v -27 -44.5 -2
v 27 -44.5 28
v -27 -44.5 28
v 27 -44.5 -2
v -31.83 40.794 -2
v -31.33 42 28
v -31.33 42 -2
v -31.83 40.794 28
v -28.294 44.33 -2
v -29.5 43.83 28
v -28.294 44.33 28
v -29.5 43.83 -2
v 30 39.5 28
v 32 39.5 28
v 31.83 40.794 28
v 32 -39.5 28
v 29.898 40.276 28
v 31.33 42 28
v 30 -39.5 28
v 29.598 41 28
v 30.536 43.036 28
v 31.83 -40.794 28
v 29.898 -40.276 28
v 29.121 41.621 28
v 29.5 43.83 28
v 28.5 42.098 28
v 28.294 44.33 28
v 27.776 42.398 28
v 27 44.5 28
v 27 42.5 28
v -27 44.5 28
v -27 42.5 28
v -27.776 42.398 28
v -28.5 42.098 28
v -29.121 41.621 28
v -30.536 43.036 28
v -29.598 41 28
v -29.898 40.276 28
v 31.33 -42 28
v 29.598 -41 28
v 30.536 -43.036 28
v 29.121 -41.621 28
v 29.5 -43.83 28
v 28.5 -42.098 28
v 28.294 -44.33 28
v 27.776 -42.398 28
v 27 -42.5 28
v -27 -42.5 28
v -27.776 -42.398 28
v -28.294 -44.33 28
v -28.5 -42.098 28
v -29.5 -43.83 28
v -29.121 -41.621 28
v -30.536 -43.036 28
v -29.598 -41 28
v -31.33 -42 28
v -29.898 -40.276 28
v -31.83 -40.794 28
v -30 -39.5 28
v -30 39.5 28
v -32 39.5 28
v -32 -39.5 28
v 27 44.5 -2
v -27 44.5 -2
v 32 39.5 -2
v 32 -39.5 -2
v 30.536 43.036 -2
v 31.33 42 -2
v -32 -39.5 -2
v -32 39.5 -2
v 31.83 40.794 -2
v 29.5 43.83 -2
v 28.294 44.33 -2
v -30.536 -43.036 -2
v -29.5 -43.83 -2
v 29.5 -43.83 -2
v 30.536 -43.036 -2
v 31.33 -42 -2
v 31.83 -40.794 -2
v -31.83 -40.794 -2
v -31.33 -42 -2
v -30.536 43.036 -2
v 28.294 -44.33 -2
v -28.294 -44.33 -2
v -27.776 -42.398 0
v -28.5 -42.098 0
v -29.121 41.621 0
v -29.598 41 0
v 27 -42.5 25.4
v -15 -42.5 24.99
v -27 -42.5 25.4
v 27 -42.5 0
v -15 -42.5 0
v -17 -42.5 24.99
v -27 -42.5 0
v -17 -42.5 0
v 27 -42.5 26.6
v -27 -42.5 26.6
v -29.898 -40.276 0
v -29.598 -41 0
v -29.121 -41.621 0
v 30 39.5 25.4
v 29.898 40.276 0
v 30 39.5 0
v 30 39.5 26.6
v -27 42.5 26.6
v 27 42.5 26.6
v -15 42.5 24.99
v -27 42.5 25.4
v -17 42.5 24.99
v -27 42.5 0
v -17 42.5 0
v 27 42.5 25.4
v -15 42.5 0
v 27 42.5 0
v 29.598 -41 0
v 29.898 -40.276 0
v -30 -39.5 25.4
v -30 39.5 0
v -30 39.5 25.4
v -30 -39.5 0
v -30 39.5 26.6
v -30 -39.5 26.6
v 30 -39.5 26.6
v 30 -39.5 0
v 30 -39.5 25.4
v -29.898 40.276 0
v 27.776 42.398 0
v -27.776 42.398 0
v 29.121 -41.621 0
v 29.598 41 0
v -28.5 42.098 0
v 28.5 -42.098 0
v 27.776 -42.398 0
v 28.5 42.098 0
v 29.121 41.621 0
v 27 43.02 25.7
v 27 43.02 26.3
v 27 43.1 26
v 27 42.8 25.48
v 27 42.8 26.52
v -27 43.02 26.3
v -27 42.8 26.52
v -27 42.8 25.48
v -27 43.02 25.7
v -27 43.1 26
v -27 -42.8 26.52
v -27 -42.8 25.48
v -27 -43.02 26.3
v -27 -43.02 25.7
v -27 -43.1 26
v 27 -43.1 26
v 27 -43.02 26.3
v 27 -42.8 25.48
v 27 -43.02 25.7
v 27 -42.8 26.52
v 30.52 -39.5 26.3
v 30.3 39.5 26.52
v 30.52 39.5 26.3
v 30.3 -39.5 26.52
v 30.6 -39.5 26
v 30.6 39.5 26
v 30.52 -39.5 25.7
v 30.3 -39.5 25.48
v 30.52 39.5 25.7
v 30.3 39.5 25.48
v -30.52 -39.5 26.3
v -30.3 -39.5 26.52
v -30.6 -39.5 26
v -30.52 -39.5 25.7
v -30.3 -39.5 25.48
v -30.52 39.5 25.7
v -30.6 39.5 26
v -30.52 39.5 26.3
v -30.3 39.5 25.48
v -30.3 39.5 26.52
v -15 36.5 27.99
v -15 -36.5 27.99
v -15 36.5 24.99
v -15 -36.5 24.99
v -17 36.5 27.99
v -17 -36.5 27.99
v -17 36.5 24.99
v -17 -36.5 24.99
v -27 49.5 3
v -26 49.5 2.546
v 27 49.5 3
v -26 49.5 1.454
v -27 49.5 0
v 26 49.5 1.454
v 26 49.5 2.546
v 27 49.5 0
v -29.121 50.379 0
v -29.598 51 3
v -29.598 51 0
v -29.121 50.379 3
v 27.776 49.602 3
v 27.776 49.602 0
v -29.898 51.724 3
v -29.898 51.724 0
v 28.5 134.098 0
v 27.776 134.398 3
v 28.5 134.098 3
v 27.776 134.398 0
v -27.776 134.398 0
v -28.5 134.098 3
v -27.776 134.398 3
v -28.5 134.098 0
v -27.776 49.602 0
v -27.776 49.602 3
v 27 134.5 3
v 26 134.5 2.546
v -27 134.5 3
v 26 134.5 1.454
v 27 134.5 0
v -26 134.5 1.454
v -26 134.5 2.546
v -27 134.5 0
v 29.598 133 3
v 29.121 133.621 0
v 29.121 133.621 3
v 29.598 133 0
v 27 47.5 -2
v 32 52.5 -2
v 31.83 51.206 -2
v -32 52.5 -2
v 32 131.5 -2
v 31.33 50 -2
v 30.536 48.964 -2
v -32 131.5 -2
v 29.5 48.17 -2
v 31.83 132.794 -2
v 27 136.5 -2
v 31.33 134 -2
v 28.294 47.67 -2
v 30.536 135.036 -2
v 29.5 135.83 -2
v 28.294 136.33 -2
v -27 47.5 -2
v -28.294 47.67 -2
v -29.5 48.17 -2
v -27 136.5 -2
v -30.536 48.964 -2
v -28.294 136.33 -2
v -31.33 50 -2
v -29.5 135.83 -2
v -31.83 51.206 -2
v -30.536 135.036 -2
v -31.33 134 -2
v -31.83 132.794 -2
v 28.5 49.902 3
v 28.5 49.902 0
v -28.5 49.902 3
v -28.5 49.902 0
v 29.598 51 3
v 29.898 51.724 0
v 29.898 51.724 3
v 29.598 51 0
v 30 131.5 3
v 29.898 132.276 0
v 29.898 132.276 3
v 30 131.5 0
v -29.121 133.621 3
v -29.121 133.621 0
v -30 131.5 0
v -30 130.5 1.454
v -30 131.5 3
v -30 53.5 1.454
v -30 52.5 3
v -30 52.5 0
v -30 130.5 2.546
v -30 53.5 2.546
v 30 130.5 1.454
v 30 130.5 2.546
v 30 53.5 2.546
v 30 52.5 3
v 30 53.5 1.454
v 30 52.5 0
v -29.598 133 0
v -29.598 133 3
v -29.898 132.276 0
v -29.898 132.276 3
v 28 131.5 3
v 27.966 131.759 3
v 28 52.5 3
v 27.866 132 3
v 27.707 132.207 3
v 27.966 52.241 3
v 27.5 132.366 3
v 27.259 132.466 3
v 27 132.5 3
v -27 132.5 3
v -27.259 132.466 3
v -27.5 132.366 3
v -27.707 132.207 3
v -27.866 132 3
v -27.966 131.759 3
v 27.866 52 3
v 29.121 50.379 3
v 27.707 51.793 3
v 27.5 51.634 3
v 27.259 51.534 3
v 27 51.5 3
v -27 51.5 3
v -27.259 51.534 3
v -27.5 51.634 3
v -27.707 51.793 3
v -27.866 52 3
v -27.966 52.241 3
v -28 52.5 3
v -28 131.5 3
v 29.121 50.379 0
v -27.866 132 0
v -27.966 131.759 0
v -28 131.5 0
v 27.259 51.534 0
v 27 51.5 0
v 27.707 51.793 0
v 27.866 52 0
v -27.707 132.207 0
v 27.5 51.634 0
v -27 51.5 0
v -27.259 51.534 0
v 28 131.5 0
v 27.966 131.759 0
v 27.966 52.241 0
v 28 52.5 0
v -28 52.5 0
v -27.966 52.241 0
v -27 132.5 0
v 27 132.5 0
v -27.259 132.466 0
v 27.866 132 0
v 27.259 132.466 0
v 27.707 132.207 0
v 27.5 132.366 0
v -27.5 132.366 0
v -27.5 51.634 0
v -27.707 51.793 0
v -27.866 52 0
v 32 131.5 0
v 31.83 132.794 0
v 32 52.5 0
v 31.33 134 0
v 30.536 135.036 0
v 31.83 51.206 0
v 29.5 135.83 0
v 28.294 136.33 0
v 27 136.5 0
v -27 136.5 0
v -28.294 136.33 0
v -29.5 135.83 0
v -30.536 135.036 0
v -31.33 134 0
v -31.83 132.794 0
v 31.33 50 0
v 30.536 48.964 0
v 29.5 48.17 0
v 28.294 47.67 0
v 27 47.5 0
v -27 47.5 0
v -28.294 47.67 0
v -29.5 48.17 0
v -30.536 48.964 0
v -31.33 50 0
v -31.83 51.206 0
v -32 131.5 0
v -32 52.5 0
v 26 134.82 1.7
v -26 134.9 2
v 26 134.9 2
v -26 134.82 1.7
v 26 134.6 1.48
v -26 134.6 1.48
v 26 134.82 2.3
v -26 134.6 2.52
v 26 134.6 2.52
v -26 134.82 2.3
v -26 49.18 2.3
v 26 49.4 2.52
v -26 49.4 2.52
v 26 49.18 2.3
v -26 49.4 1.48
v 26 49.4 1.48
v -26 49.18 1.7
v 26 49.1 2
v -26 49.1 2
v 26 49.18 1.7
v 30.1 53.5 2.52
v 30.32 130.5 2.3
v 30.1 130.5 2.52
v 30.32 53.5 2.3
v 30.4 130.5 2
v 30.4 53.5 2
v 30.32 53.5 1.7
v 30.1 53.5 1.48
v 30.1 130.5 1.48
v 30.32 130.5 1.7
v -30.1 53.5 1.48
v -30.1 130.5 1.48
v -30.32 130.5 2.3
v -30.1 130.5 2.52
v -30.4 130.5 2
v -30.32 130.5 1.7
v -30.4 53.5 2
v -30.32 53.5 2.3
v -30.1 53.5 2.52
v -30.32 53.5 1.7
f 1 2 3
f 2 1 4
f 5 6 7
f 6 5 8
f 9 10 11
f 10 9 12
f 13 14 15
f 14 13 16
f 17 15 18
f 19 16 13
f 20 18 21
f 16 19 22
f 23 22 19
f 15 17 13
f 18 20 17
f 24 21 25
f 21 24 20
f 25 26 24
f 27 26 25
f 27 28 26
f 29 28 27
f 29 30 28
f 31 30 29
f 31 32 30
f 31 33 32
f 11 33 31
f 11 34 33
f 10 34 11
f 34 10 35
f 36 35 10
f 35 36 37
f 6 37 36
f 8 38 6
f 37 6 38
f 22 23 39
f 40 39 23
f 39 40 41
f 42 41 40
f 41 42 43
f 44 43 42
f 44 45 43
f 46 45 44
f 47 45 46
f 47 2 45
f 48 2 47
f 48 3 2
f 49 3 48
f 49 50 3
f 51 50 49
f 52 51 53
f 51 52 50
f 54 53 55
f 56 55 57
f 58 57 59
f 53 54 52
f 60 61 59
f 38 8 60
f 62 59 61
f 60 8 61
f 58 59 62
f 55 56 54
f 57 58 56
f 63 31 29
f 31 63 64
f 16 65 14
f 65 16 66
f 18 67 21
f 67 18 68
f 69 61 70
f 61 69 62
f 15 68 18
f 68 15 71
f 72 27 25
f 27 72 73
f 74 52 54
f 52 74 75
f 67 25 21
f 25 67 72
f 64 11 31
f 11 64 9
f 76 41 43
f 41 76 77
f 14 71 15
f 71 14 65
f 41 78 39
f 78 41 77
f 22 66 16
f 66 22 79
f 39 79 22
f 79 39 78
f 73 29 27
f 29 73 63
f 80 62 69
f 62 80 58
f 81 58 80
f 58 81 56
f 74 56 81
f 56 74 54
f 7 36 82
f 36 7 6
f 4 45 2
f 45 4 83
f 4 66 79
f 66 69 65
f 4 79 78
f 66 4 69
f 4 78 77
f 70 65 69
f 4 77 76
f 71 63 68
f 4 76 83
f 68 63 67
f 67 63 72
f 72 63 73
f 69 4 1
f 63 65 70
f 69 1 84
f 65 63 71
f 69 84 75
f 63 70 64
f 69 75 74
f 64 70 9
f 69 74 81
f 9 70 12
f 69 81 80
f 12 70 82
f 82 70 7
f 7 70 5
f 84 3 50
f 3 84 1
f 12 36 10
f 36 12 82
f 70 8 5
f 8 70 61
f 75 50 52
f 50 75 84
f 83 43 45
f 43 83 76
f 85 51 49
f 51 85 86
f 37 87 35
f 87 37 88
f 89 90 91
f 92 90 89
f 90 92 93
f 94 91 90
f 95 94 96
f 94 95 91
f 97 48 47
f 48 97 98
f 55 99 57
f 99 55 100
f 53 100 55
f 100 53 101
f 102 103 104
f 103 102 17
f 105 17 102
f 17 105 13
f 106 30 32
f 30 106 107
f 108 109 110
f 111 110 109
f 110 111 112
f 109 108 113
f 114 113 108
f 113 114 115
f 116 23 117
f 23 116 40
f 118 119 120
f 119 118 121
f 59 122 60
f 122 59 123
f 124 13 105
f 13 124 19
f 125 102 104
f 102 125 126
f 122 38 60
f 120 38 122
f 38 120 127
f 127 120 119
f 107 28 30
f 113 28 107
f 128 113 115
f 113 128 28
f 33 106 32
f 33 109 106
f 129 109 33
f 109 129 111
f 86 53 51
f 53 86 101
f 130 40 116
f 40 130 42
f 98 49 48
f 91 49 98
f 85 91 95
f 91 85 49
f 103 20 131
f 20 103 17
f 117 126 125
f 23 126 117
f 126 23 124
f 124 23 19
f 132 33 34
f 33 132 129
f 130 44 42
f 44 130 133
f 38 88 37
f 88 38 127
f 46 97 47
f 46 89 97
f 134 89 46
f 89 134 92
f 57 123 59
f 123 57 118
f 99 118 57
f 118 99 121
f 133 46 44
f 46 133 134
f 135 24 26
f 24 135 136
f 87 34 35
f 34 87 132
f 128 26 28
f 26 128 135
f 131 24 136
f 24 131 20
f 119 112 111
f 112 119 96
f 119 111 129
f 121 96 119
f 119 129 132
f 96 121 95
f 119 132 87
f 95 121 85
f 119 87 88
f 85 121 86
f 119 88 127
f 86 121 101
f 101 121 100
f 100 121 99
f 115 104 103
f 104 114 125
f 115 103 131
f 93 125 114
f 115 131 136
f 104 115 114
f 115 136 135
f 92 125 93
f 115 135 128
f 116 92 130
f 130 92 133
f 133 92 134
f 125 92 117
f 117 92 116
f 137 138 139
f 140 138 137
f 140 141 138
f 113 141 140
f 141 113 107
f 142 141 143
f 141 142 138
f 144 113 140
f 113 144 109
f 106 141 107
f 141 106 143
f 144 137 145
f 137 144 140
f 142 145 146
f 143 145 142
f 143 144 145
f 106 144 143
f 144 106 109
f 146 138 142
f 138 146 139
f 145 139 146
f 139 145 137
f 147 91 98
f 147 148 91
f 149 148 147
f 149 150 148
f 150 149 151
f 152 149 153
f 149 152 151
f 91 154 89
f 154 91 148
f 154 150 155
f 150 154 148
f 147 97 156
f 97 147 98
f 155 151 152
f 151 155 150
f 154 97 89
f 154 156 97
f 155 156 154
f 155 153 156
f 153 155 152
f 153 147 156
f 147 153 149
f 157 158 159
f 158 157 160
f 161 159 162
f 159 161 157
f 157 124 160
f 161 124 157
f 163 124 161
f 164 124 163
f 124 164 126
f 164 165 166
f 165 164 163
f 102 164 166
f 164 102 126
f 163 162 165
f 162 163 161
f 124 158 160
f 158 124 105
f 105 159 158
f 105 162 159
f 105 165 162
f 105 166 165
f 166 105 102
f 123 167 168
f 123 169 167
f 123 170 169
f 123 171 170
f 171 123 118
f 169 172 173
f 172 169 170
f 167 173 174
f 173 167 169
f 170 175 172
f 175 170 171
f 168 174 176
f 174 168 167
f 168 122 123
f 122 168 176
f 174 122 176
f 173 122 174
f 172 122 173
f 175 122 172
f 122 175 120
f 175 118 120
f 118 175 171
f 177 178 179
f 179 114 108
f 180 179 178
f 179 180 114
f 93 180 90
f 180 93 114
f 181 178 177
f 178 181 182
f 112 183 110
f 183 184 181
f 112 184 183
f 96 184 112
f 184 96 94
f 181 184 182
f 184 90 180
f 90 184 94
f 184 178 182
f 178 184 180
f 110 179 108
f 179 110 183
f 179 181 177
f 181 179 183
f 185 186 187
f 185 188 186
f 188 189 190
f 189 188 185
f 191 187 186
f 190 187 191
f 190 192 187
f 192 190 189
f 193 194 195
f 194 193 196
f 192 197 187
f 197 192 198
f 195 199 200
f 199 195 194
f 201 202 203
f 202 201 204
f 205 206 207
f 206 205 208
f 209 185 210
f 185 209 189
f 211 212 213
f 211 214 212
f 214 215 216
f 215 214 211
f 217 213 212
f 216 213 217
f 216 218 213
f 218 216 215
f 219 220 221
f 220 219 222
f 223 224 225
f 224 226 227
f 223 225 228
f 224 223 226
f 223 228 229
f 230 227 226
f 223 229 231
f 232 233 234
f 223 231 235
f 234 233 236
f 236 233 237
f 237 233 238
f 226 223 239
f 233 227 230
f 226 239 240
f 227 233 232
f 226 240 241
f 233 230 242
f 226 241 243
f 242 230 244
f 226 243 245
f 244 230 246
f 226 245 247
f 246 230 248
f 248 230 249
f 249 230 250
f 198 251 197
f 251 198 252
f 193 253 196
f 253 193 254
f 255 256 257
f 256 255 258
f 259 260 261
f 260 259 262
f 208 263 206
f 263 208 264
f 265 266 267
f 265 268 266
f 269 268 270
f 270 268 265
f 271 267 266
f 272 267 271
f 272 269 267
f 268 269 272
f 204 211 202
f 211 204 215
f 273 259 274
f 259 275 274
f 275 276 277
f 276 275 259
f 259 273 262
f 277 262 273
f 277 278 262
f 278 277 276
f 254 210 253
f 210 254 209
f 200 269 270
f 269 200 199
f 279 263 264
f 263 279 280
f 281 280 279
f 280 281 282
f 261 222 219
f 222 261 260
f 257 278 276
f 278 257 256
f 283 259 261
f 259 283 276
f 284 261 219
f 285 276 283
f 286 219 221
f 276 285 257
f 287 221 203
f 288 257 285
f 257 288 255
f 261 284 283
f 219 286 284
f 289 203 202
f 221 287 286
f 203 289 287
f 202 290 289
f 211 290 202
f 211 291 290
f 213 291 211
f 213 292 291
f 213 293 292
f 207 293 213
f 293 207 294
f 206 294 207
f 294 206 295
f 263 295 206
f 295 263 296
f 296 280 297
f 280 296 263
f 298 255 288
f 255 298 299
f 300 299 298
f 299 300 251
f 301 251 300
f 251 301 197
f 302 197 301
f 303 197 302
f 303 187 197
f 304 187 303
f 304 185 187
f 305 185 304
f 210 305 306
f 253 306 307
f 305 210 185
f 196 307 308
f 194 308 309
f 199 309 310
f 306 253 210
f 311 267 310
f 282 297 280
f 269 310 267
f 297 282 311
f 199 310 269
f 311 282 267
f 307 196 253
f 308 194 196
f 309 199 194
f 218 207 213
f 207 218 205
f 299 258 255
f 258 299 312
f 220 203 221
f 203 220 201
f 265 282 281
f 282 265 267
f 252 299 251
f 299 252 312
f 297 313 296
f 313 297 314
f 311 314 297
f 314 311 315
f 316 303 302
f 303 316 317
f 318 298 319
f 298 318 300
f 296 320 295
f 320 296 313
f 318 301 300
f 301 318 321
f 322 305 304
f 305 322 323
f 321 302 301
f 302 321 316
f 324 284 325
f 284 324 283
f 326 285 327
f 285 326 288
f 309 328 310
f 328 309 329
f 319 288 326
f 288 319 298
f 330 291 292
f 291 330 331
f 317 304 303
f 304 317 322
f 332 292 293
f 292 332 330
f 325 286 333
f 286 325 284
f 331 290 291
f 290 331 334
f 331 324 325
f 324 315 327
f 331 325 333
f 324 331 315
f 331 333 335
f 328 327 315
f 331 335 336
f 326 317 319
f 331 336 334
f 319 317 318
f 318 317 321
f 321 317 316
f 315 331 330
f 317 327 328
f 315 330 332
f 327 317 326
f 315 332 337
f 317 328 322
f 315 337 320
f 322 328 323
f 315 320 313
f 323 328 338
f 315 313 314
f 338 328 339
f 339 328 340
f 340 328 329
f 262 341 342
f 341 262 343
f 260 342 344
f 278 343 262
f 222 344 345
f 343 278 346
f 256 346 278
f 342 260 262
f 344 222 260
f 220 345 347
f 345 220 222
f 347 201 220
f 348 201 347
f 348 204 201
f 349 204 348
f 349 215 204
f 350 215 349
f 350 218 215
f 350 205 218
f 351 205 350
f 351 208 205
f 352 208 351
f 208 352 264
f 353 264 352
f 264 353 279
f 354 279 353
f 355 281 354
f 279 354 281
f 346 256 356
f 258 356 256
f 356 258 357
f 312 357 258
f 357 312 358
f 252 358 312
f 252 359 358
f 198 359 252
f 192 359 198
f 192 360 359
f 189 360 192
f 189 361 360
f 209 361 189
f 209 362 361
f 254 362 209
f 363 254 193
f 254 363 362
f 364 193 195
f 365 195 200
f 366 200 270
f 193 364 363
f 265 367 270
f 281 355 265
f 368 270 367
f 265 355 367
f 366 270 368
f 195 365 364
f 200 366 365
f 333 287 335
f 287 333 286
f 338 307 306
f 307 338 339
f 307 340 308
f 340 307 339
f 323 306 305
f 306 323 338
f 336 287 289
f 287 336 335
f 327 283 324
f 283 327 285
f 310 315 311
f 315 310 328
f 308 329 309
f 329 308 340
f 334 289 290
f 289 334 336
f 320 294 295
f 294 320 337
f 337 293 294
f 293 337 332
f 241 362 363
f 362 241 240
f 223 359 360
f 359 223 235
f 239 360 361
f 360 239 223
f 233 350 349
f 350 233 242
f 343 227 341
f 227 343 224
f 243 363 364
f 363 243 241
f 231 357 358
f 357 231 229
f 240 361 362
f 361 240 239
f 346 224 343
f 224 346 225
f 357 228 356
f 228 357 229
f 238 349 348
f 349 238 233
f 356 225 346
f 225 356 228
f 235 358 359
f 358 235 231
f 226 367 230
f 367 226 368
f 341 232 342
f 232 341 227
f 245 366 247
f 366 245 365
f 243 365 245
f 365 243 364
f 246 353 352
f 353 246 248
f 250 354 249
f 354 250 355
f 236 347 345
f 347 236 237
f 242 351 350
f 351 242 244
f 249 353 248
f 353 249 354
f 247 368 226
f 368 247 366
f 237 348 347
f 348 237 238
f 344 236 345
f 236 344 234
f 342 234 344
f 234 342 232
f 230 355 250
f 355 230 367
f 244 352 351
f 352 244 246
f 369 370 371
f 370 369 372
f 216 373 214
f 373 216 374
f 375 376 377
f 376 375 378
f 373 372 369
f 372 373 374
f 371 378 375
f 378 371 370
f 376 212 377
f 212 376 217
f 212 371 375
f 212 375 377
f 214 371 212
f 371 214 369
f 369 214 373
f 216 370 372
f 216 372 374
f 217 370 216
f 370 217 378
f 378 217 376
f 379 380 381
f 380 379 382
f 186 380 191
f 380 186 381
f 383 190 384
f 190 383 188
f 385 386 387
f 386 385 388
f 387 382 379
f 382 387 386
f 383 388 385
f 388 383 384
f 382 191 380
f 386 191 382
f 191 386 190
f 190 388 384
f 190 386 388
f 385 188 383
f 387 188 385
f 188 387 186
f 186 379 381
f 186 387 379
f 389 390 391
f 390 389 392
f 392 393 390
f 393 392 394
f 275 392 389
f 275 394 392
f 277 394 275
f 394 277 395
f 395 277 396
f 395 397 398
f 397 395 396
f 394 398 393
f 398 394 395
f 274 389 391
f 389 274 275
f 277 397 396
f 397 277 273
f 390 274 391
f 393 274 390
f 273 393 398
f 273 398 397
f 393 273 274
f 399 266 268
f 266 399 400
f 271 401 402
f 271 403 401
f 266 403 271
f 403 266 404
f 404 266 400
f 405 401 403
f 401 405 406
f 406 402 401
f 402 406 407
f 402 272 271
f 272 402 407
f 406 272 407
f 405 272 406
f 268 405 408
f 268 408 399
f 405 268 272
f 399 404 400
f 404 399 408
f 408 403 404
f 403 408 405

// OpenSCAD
/*
 * Box with snap on lid
 * from: https://www.thingiverse.com/thing:2411898
 */


// V 1.2 Correction / hint from molotok3D, some minor fixes
// V 1.1- added opening helper and an optional separating wall

wi=60;	// inner width, length & heigth
li=85;
h=28;
th=2;	// wall thickness
r=3;	// radius of rounded corners
opening_help=false;	// make a gap to ease opening of the cover, f.ex.
		// with a coin - girls are afraid of their finger nails ;-)
separator=13;	// generate a separating wall inside - set to 0 for none

e=0.01;
ri=(r>th)?r-th:e;	// needed for the cover - needs to be larger than 0 for proper results
l=li-2*r;
w=wi-2*r;

module box(){
	difference(){
		translate([0,0,-th])hull(){
			for (i=[[-w/2,-l/2],[-w/2,l/2],[w/2,-l/2],[w/2,l/2]]){
				translate(i)cylinder(r=r+th,h=h+th,$fn=8*r);
			}
		}
		hull(){
			for (i=[[-w/2,-l/2],[-w/2,l/2,],[w/2,-l/2],[w/2,l/2]]){
				translate(i)cylinder(r=r,h=h,$fn=8*r);
			}
		}
		translate([-w/2,l/2+r,h-2])rotate([0,90,0])cylinder(d=1.2,h=w,$fn=12);
		translate([-w/2,-l/2-r,h-2])rotate([0,90,0])cylinder(d=1.2,h=w,$fn=12);
		translate([w/2+r,l/2,h-2])rotate([90,0,0])cylinder(d=1.2,h=l,$fn=12);
		translate([-w/2-r,l/2,h-2])rotate([90,0,0])cylinder(d=1.2,h=l,$fn=12);

		// if you need some adjustment for the opening helper size or position,
		// this is the right place
		if (opening_help)translate([w/2-10,l/2+13.5,h-1.8])cylinder(d=20,h=10,$fn=32);
	}
	if (separator>0){
		translate([separator-wi/2,-li/2-e,-e])difference(){
			cube([th,li+2*e,h]);
			translate([-e,-e,h-3])cube([th+2*e,2*th+2+2*e,5]);
			translate([-e,e+li-2*th-2,h-3])cube([th+2+2*e,2*th+2+2*e,5]);
		}
	}
}

module cover(){
	translate([0,0,-th])hull(){
		for (i=[[-w/2,-l/2],[-w/2,l/2],[w/2,-l/2],[w/2,l/2]]){
			translate(i)cylinder(r=r+th,h=th,$fn=8*r);
		}
	}
	difference(){
		translate([0,0,-th])hull(){
			for (i=[[-w/2,-l/2],[-w/2,l/2],[w/2,-l/2],[w/2,l/2]]){
				translate(i)cylinder(r=r,h=th+3,$fn=8*r);
			}
		}
		hull(){
			for (i=[[-w/2,-l/2],[-w/2,l/2],[w/2,-l/2],[w/2,l/2]]){
				if (r>th){
					translate(i)cylinder(r=r-th,h=3,$fn=8*r);
				}else{
					translate(i)cylinder(r=e,h=3,$fn=8*r);
				}
			}
		}
	}
	translate([-w/2+1,l/2+r-0.2,2])rotate([0,90,0])cylinder(d=1.2,h=w-2,$fn=12);
	translate([-w/2+1,-l/2-r+0.2,2])rotate([0,90,0])cylinder(d=1.2,h=w-2,$fn=12);
	translate([w/2+r-0.2,l/2-1,2])rotate([90,0,0])cylinder(d=1.2,h=l-2,$fn=12);
	translate([-w/2-r+0.2,l/2-1,2])rotate([90,0,0])cylinder(d=1.2,h=l-2,$fn=12);

}

box();
translate([0,li+3+2*th,0])
	cover();
